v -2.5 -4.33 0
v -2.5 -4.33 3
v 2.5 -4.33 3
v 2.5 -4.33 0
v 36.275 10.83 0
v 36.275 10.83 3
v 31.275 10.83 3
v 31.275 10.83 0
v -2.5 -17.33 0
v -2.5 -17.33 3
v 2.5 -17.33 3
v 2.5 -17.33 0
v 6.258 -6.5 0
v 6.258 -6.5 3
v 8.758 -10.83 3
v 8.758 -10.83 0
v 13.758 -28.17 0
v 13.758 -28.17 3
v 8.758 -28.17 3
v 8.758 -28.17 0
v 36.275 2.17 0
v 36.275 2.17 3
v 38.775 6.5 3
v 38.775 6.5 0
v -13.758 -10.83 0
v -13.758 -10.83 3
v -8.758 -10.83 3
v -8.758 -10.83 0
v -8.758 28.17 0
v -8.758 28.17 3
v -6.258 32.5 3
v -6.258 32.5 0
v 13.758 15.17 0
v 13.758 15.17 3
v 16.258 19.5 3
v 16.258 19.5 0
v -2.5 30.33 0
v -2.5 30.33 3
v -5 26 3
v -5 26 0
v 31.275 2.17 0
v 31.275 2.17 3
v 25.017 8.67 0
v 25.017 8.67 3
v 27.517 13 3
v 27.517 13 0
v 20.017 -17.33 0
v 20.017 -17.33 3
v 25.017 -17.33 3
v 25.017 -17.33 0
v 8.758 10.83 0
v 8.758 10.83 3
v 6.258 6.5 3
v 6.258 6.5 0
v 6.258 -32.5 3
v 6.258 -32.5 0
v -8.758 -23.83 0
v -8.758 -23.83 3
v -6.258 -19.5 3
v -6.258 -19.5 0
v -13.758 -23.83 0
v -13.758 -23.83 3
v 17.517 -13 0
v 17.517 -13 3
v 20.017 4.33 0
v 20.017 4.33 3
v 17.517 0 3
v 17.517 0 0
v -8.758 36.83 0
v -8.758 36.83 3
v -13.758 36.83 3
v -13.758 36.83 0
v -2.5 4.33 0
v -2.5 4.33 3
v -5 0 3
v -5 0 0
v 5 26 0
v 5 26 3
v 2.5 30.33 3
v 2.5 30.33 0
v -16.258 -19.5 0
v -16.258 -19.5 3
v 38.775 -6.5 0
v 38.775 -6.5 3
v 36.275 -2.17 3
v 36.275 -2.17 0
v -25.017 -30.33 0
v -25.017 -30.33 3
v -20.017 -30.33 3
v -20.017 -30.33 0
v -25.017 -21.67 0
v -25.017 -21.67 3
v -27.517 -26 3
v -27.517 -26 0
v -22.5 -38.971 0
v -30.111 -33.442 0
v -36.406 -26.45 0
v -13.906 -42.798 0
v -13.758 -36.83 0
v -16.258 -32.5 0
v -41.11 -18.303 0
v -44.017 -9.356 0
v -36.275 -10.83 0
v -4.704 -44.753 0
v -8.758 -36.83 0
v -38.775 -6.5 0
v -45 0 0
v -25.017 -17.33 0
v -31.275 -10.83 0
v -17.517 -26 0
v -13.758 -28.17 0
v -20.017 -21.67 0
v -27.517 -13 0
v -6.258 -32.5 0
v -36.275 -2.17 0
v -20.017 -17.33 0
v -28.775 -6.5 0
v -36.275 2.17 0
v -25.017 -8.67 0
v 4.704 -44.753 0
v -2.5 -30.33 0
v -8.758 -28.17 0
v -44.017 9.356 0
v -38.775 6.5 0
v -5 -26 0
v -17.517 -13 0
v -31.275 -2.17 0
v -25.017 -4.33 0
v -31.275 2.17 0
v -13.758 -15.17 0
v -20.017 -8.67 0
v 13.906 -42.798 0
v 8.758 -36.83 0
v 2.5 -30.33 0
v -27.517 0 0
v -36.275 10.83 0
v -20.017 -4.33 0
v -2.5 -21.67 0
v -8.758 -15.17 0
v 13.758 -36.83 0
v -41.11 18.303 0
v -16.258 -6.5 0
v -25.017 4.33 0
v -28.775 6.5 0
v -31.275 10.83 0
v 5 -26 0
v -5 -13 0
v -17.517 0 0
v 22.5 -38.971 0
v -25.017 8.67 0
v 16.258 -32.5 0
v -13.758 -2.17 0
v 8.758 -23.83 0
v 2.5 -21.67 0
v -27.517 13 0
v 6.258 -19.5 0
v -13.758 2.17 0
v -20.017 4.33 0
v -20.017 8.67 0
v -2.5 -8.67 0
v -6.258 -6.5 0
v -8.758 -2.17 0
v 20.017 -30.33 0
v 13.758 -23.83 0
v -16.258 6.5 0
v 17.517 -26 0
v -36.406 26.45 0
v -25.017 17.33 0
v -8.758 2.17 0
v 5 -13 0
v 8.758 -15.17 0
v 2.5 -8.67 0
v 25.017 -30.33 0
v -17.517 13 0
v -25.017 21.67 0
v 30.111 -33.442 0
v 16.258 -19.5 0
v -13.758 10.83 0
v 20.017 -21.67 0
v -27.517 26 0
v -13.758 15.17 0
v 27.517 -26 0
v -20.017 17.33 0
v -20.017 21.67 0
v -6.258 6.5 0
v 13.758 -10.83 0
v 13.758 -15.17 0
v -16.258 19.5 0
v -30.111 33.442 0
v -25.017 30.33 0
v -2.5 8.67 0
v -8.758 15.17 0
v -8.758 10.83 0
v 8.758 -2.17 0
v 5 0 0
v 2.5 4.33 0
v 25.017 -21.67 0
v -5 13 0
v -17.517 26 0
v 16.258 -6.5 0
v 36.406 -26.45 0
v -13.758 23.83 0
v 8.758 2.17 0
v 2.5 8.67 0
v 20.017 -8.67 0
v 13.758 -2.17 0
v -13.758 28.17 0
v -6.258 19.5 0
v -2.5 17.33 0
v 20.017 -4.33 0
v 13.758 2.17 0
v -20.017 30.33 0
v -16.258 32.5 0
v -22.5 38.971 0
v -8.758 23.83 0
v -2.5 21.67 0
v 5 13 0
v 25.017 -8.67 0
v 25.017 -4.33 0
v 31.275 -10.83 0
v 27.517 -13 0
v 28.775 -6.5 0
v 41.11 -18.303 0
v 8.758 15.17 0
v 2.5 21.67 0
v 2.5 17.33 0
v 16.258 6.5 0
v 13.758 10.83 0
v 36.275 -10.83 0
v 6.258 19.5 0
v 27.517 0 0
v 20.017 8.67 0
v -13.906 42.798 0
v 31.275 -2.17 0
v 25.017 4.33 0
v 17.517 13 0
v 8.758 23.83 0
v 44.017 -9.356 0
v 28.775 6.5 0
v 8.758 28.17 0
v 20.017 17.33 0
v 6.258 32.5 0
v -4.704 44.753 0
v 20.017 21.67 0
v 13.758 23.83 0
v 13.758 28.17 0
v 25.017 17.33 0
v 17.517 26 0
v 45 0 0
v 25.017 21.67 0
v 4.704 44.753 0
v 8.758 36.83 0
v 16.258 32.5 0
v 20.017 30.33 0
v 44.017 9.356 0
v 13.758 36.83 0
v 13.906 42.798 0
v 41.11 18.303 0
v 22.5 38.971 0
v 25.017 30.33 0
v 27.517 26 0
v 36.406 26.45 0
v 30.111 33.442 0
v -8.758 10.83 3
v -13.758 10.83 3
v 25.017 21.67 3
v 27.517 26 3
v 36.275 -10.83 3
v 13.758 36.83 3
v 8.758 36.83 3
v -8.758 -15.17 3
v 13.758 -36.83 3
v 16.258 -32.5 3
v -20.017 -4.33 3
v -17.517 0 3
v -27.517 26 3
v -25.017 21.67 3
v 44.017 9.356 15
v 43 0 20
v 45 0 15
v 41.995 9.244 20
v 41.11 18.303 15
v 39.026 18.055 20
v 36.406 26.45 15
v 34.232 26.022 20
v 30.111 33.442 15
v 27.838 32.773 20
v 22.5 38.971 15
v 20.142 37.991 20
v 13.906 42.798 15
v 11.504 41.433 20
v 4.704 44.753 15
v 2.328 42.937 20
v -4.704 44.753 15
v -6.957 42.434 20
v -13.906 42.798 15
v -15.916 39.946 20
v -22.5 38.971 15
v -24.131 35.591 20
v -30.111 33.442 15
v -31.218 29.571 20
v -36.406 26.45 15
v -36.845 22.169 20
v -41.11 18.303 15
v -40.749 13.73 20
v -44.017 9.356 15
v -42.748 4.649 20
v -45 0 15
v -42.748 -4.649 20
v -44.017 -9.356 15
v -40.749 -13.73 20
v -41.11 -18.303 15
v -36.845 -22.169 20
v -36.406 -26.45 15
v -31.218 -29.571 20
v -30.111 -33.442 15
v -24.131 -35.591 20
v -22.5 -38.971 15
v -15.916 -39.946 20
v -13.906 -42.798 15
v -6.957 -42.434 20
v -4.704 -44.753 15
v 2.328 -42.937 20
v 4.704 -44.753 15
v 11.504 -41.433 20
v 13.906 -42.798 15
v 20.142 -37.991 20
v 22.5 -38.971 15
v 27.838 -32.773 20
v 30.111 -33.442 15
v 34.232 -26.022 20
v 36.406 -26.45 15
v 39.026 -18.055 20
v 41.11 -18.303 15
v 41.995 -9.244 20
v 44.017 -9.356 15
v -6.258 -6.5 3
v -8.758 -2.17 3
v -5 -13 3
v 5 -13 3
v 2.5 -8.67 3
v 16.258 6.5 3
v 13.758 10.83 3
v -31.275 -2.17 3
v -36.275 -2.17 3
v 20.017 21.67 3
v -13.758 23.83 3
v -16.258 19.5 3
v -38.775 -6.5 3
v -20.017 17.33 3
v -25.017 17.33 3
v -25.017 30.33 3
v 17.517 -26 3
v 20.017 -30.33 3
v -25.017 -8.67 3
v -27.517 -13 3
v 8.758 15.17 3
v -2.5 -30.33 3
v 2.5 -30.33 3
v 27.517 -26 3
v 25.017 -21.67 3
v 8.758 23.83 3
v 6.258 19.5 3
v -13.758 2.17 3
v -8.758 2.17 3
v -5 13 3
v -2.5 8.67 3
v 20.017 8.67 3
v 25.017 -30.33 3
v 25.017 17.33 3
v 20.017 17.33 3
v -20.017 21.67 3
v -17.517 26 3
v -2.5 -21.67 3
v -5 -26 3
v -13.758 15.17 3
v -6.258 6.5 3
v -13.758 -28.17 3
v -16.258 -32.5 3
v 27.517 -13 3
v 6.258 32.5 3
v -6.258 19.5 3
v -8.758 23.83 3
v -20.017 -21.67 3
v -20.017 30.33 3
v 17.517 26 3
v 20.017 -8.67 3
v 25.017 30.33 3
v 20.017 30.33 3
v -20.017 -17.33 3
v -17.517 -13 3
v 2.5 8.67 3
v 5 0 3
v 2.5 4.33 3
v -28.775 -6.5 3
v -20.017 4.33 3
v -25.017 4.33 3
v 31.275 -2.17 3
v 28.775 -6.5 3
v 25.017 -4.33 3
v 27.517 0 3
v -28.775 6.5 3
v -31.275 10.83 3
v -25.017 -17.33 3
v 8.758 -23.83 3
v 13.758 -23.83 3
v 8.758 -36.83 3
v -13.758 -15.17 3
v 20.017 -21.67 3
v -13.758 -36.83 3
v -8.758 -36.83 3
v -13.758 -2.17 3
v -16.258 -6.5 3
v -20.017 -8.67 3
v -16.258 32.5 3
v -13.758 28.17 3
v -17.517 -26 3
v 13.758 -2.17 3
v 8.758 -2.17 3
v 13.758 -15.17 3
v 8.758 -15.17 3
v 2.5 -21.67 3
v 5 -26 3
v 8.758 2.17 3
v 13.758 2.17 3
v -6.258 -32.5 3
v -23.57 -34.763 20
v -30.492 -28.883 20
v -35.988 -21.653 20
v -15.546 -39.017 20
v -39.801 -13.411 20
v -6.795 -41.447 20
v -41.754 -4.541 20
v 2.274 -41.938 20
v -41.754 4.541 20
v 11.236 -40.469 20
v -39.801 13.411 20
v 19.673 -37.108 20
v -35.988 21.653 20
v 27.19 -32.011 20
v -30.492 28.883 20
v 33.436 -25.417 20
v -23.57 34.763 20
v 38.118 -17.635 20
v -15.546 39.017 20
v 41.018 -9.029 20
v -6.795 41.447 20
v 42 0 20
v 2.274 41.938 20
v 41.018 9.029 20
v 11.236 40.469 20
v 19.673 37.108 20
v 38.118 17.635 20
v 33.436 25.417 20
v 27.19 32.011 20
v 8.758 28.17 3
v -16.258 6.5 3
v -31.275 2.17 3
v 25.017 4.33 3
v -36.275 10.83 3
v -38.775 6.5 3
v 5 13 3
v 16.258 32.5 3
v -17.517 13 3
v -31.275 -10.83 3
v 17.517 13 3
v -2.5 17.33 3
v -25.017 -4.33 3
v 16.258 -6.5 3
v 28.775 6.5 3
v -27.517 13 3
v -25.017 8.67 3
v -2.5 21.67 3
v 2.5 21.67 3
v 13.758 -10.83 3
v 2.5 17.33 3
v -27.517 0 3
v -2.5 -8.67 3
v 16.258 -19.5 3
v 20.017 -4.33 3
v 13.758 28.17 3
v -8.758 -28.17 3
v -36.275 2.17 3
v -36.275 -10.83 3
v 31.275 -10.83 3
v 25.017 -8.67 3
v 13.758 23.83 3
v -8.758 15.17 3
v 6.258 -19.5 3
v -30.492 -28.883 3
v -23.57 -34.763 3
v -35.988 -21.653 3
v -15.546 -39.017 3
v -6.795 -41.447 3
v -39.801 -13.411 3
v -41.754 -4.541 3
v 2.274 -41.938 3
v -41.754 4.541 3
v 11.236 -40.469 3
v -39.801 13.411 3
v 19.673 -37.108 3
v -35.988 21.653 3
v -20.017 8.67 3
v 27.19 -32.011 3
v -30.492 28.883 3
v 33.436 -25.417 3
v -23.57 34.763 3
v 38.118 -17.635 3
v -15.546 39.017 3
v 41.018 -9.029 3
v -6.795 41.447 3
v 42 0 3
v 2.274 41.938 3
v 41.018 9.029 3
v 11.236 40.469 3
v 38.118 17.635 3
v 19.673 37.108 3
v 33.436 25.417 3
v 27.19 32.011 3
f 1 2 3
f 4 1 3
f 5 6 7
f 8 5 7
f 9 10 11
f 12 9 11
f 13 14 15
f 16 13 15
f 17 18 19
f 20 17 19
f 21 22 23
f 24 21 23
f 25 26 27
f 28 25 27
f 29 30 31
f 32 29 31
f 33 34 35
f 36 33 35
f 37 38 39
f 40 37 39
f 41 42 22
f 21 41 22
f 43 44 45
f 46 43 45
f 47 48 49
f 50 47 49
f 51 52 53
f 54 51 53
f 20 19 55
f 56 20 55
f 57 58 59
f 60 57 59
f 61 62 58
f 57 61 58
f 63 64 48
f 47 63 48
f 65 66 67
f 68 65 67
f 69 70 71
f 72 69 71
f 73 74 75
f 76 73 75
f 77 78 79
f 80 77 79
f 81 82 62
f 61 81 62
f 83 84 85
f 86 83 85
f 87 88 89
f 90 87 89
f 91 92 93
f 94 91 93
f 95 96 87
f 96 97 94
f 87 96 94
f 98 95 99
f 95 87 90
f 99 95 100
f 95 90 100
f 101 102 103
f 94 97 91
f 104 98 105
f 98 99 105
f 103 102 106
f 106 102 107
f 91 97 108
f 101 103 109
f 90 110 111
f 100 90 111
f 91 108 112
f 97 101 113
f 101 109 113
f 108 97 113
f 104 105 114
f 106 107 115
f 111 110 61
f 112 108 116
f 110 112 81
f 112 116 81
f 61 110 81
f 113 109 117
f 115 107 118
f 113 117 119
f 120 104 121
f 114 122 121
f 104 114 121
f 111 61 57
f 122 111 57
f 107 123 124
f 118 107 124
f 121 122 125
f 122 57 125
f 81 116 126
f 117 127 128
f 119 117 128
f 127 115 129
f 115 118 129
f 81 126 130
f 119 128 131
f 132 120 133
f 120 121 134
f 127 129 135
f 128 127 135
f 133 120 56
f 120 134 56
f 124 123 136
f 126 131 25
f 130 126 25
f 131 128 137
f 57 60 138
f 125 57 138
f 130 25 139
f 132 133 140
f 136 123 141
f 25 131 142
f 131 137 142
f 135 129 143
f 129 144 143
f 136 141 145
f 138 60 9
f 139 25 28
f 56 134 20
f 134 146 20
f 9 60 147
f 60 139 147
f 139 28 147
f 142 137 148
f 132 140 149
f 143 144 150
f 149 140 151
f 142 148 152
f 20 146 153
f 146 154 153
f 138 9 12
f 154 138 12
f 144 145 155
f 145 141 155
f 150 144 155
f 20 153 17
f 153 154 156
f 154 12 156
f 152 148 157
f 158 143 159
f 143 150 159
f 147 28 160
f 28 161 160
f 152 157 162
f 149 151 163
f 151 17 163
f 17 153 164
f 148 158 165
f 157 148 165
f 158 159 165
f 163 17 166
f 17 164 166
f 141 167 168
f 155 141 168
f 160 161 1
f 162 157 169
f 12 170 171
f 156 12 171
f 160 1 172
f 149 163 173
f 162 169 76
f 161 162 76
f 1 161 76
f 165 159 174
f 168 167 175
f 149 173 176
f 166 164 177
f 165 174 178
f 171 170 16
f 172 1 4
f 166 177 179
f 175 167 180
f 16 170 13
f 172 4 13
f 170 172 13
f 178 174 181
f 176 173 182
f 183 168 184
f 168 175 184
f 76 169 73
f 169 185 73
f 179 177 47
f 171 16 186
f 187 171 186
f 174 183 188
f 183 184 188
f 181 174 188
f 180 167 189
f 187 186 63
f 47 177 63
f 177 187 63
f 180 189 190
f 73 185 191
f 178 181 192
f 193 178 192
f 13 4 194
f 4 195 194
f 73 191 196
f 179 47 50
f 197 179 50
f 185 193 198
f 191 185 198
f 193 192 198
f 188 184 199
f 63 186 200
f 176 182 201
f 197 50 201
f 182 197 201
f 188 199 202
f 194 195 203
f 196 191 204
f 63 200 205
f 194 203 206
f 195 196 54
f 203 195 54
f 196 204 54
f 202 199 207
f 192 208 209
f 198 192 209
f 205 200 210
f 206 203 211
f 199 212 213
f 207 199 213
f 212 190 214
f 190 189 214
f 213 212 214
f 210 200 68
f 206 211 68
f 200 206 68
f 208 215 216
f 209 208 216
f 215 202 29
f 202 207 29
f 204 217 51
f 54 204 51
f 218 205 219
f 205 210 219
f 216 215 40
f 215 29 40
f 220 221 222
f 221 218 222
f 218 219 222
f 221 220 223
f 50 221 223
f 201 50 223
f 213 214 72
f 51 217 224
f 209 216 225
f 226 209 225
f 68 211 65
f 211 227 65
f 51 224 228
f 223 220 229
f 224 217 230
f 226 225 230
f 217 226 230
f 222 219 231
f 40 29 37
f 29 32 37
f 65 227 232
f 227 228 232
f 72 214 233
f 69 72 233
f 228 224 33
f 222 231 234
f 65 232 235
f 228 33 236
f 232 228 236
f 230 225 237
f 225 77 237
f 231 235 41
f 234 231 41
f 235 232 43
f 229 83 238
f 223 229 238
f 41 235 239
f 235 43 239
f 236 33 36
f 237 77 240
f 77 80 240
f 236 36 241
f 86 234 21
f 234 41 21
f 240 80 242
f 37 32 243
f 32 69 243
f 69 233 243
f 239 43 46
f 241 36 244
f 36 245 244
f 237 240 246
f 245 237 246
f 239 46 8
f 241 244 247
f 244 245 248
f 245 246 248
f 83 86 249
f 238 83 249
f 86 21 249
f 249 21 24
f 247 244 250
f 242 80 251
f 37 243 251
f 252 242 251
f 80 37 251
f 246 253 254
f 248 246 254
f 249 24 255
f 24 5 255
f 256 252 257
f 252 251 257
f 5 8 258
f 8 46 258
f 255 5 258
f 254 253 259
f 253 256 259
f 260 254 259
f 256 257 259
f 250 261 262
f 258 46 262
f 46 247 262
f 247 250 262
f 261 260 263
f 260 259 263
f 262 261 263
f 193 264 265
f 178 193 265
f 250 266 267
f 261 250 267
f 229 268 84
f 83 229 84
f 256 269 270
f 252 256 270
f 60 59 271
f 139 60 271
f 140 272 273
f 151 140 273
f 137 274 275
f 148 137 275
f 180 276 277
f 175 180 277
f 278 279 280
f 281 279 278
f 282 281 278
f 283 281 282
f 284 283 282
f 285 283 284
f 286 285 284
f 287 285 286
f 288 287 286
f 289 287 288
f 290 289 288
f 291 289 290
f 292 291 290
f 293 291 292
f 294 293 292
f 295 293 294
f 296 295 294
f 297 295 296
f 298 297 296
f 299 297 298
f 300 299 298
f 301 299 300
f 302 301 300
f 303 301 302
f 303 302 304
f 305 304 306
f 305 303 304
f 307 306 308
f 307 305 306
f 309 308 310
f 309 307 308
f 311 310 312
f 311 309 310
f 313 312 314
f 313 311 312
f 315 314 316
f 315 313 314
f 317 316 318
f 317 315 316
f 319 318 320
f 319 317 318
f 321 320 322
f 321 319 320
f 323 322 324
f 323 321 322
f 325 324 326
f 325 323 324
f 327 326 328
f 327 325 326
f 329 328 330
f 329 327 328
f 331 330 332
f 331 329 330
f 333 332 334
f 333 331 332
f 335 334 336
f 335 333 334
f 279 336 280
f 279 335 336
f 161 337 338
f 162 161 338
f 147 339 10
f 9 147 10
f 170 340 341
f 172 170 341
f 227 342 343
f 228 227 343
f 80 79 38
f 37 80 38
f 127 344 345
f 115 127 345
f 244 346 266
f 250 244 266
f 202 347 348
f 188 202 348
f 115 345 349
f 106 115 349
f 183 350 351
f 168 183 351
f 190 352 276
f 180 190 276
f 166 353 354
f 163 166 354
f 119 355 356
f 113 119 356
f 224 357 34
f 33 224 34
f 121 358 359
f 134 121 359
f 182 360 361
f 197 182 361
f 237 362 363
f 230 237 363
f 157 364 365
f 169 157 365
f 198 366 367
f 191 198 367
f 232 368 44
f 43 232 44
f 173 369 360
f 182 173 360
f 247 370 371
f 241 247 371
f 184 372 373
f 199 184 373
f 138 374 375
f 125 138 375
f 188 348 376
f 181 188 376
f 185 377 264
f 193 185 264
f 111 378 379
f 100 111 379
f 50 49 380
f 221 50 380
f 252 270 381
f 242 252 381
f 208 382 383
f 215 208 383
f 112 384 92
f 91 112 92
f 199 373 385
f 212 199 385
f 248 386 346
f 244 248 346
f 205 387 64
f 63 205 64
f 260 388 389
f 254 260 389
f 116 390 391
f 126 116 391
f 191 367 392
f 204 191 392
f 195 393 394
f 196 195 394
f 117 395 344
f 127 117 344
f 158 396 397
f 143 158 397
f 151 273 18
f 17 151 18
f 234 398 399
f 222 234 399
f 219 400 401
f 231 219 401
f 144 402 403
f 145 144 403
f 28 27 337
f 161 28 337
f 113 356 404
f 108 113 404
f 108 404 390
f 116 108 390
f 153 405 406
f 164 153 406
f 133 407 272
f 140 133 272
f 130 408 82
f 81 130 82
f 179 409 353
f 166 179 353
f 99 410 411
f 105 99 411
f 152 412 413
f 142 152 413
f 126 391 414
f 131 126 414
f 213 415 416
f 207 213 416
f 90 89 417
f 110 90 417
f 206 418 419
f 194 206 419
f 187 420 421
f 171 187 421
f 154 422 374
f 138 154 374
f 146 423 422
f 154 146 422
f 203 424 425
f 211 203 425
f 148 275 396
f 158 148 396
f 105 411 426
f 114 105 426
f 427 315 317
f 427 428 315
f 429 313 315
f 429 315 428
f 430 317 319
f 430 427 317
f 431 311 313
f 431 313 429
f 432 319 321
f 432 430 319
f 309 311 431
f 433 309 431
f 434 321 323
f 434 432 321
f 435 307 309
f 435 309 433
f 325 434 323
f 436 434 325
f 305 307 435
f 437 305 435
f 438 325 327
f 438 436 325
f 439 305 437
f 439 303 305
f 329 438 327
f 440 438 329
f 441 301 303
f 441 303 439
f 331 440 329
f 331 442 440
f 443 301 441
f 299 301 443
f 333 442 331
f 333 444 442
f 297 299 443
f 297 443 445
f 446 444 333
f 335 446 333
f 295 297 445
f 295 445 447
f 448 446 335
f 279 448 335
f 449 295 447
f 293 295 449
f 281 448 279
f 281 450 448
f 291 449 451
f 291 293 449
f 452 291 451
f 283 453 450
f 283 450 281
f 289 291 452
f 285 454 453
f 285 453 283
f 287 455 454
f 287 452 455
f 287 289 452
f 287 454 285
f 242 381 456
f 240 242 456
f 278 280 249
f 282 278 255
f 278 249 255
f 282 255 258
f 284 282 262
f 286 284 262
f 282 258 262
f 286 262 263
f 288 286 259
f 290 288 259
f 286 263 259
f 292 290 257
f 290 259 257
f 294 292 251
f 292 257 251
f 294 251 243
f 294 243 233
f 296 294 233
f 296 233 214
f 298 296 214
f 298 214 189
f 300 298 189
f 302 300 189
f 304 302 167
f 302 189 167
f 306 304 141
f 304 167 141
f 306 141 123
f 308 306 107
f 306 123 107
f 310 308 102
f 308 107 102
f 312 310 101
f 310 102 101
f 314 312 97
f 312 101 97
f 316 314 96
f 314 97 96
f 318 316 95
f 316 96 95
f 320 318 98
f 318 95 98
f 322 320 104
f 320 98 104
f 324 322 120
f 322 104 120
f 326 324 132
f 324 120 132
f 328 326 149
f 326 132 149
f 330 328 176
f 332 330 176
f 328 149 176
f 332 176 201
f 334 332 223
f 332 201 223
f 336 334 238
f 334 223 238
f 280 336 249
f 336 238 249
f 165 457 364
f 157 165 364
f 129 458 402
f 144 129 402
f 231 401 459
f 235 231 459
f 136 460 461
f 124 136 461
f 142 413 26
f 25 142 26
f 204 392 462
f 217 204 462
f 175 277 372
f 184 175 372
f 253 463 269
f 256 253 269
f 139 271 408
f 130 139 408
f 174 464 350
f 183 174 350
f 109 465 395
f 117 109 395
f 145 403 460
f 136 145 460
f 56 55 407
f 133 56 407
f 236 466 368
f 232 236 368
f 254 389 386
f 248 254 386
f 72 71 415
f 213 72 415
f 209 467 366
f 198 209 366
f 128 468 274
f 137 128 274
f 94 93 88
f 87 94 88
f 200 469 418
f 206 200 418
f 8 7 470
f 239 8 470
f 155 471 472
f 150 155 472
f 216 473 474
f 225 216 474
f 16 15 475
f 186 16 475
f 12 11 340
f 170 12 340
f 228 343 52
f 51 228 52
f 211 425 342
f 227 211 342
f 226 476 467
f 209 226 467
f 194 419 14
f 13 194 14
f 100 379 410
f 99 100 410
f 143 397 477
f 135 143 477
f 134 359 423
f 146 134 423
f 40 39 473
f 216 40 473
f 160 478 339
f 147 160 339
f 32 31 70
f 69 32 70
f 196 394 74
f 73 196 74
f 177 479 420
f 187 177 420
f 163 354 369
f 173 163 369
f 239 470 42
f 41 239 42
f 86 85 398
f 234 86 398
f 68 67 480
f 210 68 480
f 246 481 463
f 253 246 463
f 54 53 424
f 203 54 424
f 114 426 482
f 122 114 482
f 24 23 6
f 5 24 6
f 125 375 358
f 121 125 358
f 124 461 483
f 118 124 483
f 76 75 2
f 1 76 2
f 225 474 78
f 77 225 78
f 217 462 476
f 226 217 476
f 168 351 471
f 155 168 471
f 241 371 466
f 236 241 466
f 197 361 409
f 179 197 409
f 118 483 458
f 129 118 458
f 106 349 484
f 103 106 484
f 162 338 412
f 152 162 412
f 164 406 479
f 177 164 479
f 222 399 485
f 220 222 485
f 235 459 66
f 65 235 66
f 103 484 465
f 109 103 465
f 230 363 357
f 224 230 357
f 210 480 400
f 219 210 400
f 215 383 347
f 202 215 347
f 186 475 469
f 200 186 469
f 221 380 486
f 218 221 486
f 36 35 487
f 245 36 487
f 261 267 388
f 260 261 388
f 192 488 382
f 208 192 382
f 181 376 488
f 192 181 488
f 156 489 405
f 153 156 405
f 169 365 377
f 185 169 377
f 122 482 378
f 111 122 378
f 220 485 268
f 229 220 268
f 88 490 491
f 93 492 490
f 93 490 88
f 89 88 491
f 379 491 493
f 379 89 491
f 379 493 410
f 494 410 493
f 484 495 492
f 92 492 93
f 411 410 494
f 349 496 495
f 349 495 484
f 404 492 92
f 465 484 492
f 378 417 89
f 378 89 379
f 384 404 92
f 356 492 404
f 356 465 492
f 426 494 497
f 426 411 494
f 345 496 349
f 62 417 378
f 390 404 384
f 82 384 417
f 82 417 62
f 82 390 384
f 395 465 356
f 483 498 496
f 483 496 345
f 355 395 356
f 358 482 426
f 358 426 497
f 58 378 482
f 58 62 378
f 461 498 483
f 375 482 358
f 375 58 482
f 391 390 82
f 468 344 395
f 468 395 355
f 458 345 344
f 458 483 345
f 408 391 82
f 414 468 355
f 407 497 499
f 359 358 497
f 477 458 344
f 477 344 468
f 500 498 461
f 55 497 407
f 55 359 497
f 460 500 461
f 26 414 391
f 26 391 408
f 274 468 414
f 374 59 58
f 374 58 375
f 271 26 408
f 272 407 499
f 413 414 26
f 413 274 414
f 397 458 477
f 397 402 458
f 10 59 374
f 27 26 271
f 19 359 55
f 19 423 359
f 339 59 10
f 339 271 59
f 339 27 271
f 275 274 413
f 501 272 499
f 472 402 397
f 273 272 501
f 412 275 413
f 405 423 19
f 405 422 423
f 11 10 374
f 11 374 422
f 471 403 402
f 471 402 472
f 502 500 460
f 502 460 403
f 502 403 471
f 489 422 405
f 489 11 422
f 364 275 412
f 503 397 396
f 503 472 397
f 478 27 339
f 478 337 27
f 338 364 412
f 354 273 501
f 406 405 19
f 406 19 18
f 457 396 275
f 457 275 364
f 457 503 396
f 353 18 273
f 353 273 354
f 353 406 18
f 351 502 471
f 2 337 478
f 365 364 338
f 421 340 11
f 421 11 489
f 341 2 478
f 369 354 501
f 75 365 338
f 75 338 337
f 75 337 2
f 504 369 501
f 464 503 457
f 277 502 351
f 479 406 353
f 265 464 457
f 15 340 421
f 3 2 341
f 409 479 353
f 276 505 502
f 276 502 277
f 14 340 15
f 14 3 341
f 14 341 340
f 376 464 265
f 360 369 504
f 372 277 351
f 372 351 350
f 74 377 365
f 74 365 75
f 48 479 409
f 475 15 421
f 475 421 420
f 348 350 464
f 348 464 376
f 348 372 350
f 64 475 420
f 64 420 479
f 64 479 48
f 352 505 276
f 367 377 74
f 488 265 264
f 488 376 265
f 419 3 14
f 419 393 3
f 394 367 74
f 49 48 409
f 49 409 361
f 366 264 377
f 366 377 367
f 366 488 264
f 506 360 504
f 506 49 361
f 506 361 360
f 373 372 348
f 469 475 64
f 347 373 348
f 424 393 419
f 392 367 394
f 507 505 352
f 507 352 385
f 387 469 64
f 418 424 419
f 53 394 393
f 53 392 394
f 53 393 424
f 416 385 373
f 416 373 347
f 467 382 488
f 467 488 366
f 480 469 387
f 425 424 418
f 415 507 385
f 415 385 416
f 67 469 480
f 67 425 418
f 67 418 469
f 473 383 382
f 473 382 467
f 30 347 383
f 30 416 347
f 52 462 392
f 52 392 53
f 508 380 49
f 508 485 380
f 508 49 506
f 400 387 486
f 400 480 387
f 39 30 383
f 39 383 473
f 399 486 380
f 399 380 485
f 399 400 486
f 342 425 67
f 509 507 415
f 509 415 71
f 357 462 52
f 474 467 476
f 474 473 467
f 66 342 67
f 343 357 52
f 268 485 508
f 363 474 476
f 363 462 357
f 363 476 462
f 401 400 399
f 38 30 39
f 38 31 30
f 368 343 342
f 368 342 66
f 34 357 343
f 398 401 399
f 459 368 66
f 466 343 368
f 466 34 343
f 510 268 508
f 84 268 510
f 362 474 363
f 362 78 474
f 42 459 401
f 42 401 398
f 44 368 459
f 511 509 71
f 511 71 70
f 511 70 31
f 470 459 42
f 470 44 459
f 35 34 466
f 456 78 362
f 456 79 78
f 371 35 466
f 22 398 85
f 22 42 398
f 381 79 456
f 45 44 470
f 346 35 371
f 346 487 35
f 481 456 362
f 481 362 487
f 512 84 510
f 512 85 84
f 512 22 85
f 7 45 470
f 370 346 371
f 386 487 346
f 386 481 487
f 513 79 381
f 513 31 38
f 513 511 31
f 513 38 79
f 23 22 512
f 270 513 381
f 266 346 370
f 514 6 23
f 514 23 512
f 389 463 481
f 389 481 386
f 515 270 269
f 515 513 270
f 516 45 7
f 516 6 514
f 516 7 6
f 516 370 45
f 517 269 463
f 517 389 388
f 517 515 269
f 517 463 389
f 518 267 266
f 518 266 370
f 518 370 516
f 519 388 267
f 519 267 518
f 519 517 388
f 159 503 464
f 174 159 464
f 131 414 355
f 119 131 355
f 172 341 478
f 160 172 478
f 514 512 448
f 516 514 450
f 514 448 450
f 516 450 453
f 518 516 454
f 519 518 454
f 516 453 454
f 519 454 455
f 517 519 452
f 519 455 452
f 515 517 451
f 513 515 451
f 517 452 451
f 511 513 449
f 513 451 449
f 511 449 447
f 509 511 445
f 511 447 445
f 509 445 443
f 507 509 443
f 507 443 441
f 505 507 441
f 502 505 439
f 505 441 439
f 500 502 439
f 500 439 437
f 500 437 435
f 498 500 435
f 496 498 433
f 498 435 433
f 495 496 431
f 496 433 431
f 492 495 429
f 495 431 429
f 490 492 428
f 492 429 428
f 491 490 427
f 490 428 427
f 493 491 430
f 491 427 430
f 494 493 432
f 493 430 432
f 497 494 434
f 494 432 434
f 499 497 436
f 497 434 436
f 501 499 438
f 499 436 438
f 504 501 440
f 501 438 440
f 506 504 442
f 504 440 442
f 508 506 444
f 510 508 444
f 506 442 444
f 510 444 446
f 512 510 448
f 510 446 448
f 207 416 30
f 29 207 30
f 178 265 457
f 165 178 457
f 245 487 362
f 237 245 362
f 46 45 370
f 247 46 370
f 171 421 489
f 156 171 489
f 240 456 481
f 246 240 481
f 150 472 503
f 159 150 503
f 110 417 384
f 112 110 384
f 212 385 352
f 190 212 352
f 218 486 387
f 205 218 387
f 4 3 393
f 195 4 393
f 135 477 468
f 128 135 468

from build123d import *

# Parameters (mm, degrees)
SKETCH_R              = 45
PAD_DEPTH             = 20
SKETCH001_R           = 42
POCKET_DEPTH          = 17
POCKET001_DEPTH       = 5
POLARPATTERN_COUNT    = 6
POCKET002_DEPTH       = 5
POLARPATTERN001_COUNT = 6
POCKET003_DEPTH       = 5
POLARPATTERN002_COUNT = 6
POCKET004_DEPTH       = 5
POLARPATTERN003_COUNT = 6
POCKET005_DEPTH       = 5
POLARPATTERN004_COUNT = 6
POCKET006_DEPTH       = 5
CHAMFER_SIZE2         = 2
CHAMFER_SIZE          = 5


with BuildPart() as part:
    # Sketch → Pad (new body)
    with BuildSketch(Plane.XY):
        Circle(SKETCH_R)
    extrude(amount=PAD_DEPTH)

    # Sketch001 (on Face3 of Pad) → Pocket (cut)
    with BuildSketch(Plane.XY.offset(20)):
        Circle(SKETCH001_R)
    extrude(amount=-POCKET_DEPTH, mode=Mode.SUBTRACT)

    # Sketch003 (on Face5 of Pocket) → Pocket001 (cut)
    with BuildSketch(Plane.XY.offset(3)):
        Polygon((-6.25833, 6.5), (-8.75833, 10.830127), (-13.75833, 10.830127), (-16.25833, 6.5), (-13.75833, 2.169873), (-8.75833, 2.169873), align=None)
    pocket001 = extrude(amount=-POCKET001_DEPTH, mode=Mode.SUBTRACT)

    # PolarPattern: Pocket001 ×6 about axis
    polarpattern_axis = Axis((0, 0, 3), (0, 0, 1))
    for i in range(1, POLARPATTERN_COUNT):
        add(pocket001.rotate(polarpattern_axis, i * 360 / POLARPATTERN_COUNT), mode=Mode.SUBTRACT)

    # Sketch004 (on Face41 of PolarPattern) → Pocket002 (cut)
    with BuildSketch(Plane.XY.offset(3)):
        Polygon((13.75833, -23.830127), (16.25833, -19.5), (13.75833, -15.169873), (8.75833, -15.169873), (6.25833, -19.5), (8.75833, -23.830127), align=None)
    pocket002 = extrude(amount=-POCKET002_DEPTH, mode=Mode.SUBTRACT)

    # PolarPattern001: Pocket002 ×6 about axis
    polarpattern001_axis = Axis((0, 0, 3), (0, 0, 1))
    for i in range(1, POLARPATTERN001_COUNT):
        add(pocket002.rotate(polarpattern001_axis, i * 360 / POLARPATTERN001_COUNT), mode=Mode.SUBTRACT)

    # Sketch005 (on Face77 of PolarPattern001) → Pocket003 (cut)
    with BuildSketch(Plane.XY.offset(3)):
        Polygon((2.5, -30.330127), (5, -26), (2.5, -21.669873), (-2.5, -21.669873), (-5, -26), (-2.5, -30.330127), align=None)
    pocket003 = extrude(amount=-POCKET003_DEPTH, mode=Mode.SUBTRACT)

    # PolarPattern002: Pocket003 ×6 about axis
    polarpattern002_axis = Axis((0, 0, 3), (0, 0, 1))
    for i in range(1, POLARPATTERN002_COUNT):
        add(pocket003.rotate(polarpattern002_axis, i * 360 / POLARPATTERN002_COUNT), mode=Mode.SUBTRACT)

    # Sketch006 (on Face113 of PolarPattern002) → Pocket004 (cut)
    with BuildSketch(Plane.XY.offset(3)):
        Polygon((-8.75833, -36.830127), (-6.25833, -32.5), (-8.75833, -28.169873), (-13.75833, -28.169873), (-16.25833, -32.5), (-13.75833, -36.830127), align=None)
    pocket004 = extrude(amount=-POCKET004_DEPTH, mode=Mode.SUBTRACT)

    # PolarPattern003: Pocket004 ×6 about axis
    polarpattern003_axis = Axis((0, 0, 3), (0, 0, 1))
    for i in range(1, POLARPATTERN003_COUNT):
        add(pocket004.rotate(polarpattern003_axis, i * 360 / POLARPATTERN003_COUNT), mode=Mode.SUBTRACT)

    # Sketch007 (on Face149 of PolarPattern003) → Pocket005 (cut)
    with BuildSketch(Plane.XY.offset(3)):
        Polygon((13.75833, -36.830127), (16.25833, -32.5), (13.75833, -28.169873), (8.75833, -28.169873), (6.25833, -32.5), (8.75833, -36.830127), align=None)
    pocket005 = extrude(amount=-POCKET005_DEPTH, mode=Mode.SUBTRACT)

    # PolarPattern004: Pocket005 ×6 about axis
    polarpattern004_axis = Axis((0, 0, 3), (0, 0, 1))
    for i in range(1, POLARPATTERN004_COUNT):
        add(pocket005.rotate(polarpattern004_axis, i * 360 / POLARPATTERN004_COUNT), mode=Mode.SUBTRACT)

    # Sketch008 (on Face185 of PolarPattern004) → Pocket006 (cut)
    with BuildSketch(Plane.XY.offset(3)):
        Polygon((2.5, -4.330127), (5, 0), (2.5, 4.330127), (-2.5, 4.330127), (-5, 0), (-2.5, -4.330127), align=None)
    extrude(amount=-POCKET006_DEPTH, mode=Mode.SUBTRACT)

    # Chamfer
    chamfer_edges = [part.edges().sort_by_distance(p)[0] for p in [
        (-45, 0, 20),
    ]]
    chamfer_side = part.faces().sort_by_distance((-45, 0, 10))[0]
    chamfer(chamfer_edges, length=CHAMFER_SIZE, length2=CHAMFER_SIZE2, reference=chamfer_side)


solid = part.part
